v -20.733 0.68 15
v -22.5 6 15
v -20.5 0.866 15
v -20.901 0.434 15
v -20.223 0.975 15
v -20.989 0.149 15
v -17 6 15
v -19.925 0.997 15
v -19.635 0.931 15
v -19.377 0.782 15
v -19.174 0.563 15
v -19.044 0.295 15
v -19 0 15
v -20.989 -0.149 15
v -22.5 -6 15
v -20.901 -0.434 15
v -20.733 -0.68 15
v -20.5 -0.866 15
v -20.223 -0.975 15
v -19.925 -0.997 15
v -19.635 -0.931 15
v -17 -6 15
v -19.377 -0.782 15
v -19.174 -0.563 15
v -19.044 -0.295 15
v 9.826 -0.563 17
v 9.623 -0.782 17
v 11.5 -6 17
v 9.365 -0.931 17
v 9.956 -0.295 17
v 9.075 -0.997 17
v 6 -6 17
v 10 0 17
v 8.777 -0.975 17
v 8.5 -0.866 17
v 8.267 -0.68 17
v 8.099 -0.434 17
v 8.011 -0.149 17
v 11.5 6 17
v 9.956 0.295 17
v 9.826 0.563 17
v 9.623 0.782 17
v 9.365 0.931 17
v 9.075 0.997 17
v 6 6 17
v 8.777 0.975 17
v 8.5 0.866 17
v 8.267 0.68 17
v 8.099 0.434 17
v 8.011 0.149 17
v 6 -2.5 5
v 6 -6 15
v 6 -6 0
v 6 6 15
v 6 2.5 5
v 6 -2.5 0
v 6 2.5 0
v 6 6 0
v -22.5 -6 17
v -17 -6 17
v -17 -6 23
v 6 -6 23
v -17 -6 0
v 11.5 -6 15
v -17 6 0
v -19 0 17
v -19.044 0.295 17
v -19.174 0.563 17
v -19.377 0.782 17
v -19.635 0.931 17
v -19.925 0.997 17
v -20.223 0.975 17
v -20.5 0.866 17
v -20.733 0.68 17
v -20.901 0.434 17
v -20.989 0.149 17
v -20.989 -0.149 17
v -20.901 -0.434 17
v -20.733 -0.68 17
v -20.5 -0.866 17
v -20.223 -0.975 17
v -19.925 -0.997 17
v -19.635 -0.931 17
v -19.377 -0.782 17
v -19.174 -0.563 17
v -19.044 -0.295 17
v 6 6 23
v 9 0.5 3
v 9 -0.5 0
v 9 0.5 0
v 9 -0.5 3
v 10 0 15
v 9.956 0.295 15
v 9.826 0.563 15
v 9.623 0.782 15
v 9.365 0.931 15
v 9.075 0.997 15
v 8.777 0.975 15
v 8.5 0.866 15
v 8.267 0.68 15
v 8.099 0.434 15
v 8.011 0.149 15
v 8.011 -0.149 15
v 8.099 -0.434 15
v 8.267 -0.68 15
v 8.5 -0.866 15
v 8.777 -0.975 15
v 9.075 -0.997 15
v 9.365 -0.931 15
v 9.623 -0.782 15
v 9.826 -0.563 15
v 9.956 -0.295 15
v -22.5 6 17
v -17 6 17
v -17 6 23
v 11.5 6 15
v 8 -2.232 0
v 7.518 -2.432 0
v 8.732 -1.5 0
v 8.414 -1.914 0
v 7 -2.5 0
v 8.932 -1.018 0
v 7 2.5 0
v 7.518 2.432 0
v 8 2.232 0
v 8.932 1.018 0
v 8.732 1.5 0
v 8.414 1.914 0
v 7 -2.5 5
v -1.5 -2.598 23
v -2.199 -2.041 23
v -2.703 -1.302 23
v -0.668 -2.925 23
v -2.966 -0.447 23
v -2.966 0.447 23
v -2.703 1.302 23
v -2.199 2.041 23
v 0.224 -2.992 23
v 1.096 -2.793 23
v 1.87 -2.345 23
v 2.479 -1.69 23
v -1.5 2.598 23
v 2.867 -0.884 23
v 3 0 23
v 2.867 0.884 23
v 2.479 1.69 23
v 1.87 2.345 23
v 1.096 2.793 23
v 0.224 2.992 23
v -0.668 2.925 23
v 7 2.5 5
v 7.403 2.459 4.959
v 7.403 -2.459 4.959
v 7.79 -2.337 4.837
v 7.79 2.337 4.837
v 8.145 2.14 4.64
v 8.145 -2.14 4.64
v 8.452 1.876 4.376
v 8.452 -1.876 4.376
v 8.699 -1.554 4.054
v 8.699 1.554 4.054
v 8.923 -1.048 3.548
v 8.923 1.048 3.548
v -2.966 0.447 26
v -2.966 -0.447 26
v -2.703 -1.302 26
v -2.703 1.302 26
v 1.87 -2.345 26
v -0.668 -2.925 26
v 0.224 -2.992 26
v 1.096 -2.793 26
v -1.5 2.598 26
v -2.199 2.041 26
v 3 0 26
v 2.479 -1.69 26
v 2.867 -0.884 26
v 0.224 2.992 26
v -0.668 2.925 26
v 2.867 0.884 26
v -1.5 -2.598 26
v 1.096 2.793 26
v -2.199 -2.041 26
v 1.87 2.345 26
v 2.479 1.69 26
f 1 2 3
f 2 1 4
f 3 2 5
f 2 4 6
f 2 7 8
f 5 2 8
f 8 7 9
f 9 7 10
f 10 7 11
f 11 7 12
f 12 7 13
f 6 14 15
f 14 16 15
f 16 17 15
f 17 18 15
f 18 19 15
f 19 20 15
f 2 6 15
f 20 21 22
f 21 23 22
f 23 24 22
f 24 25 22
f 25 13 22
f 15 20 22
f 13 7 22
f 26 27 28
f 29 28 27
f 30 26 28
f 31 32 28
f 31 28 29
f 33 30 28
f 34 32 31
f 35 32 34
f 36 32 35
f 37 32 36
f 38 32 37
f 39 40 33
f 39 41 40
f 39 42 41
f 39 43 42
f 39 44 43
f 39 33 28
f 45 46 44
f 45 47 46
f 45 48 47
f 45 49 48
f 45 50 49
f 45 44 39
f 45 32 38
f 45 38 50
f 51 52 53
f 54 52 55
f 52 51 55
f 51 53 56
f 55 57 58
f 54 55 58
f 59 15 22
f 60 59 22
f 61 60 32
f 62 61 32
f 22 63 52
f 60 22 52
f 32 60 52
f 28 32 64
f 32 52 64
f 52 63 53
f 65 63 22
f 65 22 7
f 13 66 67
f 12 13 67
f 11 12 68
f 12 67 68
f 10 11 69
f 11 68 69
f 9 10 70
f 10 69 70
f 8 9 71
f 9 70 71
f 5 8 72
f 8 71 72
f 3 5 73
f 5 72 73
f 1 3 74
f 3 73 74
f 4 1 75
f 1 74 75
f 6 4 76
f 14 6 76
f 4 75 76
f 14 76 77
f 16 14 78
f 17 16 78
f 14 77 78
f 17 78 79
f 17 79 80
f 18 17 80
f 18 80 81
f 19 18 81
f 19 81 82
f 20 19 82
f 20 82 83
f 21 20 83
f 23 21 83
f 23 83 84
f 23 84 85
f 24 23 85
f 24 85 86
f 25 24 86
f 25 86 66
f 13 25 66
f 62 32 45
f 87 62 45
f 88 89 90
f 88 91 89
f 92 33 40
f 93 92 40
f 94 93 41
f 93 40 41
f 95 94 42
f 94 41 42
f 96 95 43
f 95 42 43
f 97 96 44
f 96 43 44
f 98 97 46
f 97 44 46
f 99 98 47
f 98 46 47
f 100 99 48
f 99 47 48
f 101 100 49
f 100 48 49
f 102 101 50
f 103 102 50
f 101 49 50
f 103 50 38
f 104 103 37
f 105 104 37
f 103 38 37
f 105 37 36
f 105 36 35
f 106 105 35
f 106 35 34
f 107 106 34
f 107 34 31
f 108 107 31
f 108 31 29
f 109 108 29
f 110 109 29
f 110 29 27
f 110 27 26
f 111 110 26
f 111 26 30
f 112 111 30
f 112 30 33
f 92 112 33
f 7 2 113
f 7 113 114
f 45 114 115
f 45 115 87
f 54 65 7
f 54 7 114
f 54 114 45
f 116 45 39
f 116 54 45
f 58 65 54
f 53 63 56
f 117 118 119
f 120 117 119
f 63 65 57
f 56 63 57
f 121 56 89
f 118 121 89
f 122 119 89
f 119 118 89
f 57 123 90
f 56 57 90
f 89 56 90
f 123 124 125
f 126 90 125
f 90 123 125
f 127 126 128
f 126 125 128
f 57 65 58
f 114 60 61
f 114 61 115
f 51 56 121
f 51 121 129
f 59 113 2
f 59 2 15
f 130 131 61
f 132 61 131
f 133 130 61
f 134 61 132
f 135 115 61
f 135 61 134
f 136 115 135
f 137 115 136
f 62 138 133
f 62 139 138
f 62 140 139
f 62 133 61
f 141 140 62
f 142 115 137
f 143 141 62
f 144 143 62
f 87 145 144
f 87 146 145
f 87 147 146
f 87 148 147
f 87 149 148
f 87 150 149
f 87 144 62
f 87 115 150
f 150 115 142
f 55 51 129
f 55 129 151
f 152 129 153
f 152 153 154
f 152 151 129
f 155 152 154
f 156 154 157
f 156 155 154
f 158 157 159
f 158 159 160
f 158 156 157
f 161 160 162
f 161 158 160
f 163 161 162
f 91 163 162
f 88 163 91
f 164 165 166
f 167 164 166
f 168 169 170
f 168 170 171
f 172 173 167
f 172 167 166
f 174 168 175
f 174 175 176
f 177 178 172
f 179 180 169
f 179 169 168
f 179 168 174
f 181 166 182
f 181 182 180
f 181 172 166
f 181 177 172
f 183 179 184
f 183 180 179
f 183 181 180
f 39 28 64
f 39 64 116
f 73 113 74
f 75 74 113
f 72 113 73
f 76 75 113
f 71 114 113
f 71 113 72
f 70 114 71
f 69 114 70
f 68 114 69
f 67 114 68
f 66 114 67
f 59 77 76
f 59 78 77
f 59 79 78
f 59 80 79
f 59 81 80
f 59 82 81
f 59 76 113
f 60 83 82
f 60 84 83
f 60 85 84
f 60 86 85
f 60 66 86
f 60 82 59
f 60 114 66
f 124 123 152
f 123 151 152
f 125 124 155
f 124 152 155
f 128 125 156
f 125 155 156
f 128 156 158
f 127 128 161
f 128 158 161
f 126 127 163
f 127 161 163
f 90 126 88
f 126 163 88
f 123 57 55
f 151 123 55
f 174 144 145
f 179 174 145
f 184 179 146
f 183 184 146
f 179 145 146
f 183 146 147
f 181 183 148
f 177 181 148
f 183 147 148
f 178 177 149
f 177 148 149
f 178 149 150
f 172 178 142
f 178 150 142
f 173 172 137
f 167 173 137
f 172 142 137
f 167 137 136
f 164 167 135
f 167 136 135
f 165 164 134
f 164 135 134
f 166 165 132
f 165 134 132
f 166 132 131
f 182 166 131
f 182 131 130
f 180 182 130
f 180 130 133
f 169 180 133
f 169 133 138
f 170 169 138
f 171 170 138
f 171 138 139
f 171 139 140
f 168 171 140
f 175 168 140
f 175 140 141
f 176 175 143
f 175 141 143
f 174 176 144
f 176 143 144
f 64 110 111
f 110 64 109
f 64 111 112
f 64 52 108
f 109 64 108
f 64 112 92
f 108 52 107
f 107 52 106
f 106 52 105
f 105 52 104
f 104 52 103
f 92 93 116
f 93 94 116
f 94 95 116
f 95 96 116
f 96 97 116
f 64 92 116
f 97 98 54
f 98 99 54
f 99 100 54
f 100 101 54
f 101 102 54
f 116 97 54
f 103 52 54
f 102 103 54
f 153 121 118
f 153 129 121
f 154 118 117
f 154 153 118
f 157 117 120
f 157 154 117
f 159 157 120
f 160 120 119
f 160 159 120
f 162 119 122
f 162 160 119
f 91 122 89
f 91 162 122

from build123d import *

# Parameters (mm, degrees)
SKETCH_W     = 23
SKETCH_H     = 12
PAD_DEPTH    = 23
SKETCH001_W  = 12
SKETCH001_H  = 2
PAD001_DEPTH = 5.5
SKETCH002_W  = 12
SKETCH002_H  = 2
PAD002_DEPTH = 5.5
SKETCH003_R  = 1
POCKET_DEPTH = 5
SKETCH004_R  = 3
PAD003_DEPTH = 3
SKETCH006_W  = 5
SKETCH006_H  = 5
PAD004_DEPTH = 3
FILLET_R     = 2


with BuildPart() as part:
    # Sketch → Pad (new body)
    with BuildSketch(Plane.XY):
        with Locations((-5.5, 0)):
            Rectangle(SKETCH_W, SKETCH_H)
    extrude(amount=PAD_DEPTH)

    # Sketch001 (on Face2 of Pad) → Pad001 (join)
    with BuildSketch(Plane.YZ.offset(6)):
        with Locations((0, 16)):
            Rectangle(SKETCH001_W, SKETCH001_H)
    extrude(amount=PAD001_DEPTH)

    # Sketch002 (on Face2 of Pad001) → Pad002 (join)
    with BuildSketch(Plane(origin=(-17, 0, 0), x_dir=(0, -1, 0), z_dir=(-1, 0, 0))):
        with Locations((0, 16)):
            Rectangle(SKETCH002_W, SKETCH002_H)
    extrude(amount=PAD002_DEPTH)

    # Sketch003 (on Face12 of Pad002) → Pocket (cut)
    with BuildSketch(Plane.XY.offset(17)):
        with Locations((-20, 0)):
            Circle(SKETCH003_R)
        with Locations((9, 0)):
            Circle(SKETCH003_R)
    extrude(amount=-POCKET_DEPTH, mode=Mode.SUBTRACT)

    # Sketch004 (on Face9 of Pocket) → Pad003 (join)
    with BuildSketch(Plane.XY.offset(23)):
        Circle(SKETCH004_R)
    extrude(amount=PAD003_DEPTH)

    # Sketch006 → Pad004 (join)
    with BuildSketch(Plane.YZ.offset(6)):
        with Locations((0, 2.5)):
            Rectangle(SKETCH006_W, SKETCH006_H)
    extrude(amount=PAD004_DEPTH)

    # Fillet
    fillet_edges = [part.edges().sort_by_distance(p)[0] for p in [
        (9, -2.5, 2.5),
        (9, 2.5, 2.5),
        (9, 0, 5),
    ]]
    fillet(fillet_edges, radius=FILLET_R)


solid = part.part
